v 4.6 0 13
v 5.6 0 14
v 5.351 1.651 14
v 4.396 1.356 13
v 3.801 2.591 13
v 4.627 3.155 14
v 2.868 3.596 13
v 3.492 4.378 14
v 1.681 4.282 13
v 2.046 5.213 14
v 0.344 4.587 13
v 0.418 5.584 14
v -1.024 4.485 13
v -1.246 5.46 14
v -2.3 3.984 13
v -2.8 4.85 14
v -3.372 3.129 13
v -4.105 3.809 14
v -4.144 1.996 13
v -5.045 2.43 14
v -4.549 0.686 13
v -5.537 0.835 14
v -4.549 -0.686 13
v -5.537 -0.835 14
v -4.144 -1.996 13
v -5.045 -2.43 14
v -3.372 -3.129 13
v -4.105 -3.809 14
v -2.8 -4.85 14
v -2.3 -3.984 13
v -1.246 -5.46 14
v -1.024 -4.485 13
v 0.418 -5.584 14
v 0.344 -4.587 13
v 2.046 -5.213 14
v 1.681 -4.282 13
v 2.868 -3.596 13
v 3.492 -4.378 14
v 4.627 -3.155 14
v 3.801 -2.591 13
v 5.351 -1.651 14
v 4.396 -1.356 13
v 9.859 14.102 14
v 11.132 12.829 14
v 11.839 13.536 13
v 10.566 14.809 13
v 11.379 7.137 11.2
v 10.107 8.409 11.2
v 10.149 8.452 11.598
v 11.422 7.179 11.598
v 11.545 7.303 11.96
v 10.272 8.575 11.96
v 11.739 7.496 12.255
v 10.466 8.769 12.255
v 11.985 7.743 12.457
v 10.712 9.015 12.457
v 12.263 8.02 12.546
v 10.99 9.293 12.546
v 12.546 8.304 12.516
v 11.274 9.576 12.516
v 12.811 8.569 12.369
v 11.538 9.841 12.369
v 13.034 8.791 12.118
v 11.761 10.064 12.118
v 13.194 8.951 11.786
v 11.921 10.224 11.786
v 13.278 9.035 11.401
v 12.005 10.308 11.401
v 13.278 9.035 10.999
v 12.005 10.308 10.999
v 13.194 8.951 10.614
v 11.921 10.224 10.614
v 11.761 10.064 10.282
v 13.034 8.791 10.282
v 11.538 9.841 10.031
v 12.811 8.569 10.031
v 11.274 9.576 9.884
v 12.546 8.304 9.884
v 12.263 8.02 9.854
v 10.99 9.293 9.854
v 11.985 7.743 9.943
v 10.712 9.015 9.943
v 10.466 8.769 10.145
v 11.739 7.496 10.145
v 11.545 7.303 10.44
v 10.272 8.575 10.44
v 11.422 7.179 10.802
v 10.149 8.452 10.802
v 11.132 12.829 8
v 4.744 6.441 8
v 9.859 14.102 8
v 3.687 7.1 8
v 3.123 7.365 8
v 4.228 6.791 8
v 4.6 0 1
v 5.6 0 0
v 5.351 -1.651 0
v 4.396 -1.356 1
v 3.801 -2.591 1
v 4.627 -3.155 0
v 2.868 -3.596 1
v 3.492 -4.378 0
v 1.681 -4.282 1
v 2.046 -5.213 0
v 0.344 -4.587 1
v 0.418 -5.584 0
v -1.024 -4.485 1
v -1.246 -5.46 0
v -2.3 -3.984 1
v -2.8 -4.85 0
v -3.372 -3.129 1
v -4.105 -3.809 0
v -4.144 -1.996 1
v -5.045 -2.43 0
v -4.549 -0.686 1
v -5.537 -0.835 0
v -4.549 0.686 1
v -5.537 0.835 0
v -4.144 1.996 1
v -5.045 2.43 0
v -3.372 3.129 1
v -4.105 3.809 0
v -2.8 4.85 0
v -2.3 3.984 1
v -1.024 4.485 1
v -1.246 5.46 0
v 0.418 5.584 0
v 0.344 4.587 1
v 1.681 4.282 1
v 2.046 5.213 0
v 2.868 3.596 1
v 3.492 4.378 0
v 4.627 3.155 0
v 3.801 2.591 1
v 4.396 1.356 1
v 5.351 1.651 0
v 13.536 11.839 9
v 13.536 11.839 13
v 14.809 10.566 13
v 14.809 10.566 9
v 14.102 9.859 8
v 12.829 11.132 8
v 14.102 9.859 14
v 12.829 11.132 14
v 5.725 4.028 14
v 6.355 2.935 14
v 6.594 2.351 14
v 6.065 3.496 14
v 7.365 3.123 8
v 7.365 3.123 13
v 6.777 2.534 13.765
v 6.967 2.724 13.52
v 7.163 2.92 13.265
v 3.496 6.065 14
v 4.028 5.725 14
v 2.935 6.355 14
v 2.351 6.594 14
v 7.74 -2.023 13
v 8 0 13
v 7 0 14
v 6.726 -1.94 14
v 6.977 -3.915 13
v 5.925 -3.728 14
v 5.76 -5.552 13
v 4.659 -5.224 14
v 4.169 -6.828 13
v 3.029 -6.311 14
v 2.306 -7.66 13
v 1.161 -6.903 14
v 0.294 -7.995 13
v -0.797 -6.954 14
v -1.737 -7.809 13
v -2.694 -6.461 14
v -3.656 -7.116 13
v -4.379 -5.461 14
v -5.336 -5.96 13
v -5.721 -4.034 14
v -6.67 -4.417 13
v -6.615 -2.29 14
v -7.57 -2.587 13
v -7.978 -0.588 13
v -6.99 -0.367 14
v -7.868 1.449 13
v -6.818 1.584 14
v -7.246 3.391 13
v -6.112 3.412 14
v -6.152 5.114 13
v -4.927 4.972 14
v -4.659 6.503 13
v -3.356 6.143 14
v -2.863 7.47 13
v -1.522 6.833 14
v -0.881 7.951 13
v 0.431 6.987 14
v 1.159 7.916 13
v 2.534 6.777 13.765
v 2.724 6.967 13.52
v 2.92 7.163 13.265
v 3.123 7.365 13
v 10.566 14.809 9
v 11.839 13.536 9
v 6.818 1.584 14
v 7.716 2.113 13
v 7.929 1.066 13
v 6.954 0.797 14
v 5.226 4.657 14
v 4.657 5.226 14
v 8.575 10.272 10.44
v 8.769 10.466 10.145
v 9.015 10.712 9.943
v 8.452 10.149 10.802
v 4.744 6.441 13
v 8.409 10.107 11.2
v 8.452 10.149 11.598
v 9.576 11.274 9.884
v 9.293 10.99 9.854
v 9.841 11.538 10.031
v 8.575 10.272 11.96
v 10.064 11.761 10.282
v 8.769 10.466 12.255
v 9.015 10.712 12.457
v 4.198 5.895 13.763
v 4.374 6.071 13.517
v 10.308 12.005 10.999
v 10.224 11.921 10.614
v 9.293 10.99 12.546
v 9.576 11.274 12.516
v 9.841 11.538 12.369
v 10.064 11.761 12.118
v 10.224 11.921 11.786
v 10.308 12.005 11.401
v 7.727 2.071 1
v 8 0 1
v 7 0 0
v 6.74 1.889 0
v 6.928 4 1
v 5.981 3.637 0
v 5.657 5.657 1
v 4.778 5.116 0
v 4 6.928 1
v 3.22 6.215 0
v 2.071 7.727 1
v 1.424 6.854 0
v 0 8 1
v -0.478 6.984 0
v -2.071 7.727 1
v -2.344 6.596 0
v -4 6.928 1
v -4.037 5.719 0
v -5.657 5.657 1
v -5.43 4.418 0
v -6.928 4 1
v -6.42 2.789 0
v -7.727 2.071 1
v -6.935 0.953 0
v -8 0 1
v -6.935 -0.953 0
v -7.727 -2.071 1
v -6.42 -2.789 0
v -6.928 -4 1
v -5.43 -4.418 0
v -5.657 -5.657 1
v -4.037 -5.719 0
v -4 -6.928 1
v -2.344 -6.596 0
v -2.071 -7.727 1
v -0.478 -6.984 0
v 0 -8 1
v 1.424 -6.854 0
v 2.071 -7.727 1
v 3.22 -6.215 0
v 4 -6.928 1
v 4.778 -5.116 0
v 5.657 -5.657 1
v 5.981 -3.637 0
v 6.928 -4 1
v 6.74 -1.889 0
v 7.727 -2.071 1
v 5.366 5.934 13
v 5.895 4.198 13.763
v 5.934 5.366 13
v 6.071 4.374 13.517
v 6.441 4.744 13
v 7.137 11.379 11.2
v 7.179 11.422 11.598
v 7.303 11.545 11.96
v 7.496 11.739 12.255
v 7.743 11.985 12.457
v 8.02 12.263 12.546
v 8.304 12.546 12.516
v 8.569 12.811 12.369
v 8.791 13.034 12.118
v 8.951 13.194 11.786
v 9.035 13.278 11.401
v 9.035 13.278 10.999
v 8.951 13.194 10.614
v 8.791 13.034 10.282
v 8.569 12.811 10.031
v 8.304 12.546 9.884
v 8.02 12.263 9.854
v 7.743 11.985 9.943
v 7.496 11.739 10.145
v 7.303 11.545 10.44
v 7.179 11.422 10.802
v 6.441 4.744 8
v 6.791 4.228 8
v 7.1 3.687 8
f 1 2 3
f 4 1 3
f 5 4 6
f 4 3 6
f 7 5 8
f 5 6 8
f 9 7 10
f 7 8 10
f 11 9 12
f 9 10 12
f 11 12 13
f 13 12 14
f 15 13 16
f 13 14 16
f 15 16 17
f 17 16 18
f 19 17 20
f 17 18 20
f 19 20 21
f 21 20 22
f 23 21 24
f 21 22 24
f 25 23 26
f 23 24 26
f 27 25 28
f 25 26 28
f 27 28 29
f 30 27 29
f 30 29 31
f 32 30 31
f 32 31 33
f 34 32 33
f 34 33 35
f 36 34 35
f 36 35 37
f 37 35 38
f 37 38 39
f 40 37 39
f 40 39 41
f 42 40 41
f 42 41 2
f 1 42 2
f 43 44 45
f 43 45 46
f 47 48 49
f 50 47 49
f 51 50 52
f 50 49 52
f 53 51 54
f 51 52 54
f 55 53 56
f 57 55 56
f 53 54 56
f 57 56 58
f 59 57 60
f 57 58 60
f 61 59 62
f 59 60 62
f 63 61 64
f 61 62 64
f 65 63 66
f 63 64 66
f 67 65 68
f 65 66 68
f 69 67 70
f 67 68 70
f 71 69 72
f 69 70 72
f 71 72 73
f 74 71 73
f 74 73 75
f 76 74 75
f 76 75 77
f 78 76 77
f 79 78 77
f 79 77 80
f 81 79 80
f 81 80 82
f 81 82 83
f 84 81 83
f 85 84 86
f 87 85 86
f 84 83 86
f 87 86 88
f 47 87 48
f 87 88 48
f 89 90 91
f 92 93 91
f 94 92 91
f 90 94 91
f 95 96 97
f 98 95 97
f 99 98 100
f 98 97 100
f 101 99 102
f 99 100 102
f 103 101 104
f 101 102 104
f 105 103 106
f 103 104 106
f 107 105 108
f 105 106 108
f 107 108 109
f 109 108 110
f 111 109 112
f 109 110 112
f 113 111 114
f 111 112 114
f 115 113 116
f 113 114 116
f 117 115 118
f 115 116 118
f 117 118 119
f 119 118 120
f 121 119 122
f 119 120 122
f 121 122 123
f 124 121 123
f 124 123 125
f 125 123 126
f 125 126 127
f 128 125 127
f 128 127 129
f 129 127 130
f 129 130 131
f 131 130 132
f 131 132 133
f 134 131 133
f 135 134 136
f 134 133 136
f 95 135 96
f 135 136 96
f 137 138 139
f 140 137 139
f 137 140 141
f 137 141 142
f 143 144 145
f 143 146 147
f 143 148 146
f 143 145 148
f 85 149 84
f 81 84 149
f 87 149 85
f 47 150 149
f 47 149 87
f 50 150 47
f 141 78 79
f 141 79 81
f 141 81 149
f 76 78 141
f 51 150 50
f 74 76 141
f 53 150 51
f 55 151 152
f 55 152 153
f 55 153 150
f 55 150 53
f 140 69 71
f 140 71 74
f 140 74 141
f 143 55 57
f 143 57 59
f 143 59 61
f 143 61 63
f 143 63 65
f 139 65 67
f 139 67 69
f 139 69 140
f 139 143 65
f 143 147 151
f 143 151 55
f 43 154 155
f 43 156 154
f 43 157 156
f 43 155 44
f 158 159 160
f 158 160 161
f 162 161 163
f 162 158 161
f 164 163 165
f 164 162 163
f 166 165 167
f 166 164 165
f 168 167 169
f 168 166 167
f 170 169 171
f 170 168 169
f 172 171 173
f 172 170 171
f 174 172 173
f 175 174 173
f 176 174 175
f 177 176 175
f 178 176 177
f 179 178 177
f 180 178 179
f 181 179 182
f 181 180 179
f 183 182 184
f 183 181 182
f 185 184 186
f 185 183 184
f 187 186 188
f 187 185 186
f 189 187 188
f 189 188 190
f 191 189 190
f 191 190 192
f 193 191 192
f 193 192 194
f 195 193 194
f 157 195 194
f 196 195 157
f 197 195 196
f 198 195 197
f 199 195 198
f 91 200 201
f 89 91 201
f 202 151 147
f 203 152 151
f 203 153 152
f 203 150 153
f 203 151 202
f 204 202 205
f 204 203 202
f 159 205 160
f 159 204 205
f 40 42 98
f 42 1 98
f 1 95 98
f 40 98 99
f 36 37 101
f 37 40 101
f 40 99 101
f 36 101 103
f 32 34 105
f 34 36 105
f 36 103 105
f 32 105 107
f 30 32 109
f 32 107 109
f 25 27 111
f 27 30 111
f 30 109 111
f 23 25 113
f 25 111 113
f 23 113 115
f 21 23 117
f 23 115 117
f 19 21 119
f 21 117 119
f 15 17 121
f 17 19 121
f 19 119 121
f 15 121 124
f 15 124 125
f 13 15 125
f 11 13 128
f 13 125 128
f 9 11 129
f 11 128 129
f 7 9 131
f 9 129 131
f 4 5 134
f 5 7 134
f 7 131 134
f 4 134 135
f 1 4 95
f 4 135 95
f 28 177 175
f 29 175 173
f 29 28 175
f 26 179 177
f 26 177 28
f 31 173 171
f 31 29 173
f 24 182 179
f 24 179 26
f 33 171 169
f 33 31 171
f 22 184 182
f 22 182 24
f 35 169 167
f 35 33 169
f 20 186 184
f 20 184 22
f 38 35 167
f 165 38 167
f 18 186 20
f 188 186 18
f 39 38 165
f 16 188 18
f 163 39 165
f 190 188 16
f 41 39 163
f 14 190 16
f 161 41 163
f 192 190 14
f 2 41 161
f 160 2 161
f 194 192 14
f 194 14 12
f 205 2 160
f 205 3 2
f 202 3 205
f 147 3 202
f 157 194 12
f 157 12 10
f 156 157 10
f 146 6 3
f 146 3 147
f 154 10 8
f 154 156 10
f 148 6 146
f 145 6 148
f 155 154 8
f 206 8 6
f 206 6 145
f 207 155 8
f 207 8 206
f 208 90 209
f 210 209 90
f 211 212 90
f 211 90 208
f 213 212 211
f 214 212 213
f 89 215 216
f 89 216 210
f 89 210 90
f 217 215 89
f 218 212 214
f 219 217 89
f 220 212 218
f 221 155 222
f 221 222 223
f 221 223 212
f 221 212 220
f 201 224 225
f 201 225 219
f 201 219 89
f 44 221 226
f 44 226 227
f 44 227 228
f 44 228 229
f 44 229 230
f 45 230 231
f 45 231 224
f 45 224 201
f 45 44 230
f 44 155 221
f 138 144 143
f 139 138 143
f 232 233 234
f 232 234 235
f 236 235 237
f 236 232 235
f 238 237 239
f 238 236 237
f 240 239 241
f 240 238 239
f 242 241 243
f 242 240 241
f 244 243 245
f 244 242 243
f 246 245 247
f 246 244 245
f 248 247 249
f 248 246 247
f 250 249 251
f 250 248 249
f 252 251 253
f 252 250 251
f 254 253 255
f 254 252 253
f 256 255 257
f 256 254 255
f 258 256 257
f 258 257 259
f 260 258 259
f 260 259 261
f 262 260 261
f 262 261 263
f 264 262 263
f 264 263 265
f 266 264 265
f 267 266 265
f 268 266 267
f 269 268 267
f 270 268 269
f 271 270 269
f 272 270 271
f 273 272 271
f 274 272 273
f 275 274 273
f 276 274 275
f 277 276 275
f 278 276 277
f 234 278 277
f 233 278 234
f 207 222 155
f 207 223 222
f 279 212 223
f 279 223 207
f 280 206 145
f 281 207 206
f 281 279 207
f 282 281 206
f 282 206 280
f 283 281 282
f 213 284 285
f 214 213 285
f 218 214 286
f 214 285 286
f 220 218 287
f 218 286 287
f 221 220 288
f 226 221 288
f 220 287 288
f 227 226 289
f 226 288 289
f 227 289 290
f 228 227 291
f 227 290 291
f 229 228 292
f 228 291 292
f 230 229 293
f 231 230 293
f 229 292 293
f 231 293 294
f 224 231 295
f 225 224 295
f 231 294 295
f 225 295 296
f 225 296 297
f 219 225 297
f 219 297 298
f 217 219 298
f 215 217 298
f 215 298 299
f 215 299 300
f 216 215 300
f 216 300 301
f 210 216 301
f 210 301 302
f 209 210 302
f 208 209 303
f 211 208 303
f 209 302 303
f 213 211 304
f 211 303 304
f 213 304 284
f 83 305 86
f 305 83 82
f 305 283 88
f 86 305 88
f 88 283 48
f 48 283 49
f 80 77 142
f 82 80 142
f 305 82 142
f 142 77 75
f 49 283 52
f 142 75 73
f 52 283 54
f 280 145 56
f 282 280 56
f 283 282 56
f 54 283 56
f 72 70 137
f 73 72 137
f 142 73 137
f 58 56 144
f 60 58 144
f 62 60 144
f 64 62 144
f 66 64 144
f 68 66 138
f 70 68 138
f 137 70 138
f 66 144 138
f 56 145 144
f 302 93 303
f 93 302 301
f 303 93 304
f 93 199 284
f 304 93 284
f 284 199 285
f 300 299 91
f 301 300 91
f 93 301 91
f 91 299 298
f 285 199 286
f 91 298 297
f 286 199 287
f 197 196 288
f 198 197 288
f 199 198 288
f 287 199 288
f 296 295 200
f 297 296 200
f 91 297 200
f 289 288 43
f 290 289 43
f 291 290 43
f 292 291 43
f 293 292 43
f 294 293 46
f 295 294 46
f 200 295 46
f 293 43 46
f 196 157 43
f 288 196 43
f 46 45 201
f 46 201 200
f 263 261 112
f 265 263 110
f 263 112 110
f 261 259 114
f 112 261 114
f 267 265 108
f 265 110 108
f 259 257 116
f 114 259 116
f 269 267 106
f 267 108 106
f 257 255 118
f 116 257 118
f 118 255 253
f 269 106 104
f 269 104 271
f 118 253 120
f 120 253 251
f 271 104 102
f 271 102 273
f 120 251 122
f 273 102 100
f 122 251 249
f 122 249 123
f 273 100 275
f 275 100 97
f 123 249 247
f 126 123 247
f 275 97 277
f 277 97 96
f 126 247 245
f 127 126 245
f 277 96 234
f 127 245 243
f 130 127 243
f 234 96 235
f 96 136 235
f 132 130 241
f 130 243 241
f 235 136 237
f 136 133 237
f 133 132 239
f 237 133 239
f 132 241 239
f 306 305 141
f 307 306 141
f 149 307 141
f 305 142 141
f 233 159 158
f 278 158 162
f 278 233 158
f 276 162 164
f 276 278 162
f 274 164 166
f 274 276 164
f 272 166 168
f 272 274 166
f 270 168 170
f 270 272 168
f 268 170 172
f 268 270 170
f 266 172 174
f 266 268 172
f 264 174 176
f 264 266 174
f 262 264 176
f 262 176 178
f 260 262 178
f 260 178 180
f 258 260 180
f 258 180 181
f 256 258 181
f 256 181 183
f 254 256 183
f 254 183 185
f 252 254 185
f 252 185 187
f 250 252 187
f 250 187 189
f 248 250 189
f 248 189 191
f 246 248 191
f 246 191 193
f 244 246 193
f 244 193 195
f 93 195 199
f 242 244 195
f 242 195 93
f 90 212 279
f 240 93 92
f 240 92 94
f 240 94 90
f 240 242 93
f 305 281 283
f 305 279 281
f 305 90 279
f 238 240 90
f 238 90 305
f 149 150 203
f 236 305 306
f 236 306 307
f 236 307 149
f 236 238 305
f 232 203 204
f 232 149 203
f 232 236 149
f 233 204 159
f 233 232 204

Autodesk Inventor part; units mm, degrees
ref_plane "YZ Plane" through (0, 0, 0) normal (1, 0, 0) x (0, 1, 0)
ref_plane "XZ Plane" through (0, 0, 0) normal (0, 1, 0) x (-1, 0, 0)
ref_plane "XY Plane" through (0, 0, 0) normal (0, 0, 1) x (1, 0, 0)
sketch "Эскиз1" plane through (0, 0, 0) normal (0, 0, 1) x (1, 0, 0)
  circle A0 centre (0, 0) radius 8.1 projected
  circle A1 centre (0, 0) radius 8
  circle A2 centre (0, 0) radius 4.6
  dimension "d0" = 0.1
  dimension "d1" = 9.2
extrude "Выдавливание1" add sketch "Эскиз1" along normal blind 14 contours A1
chamfer "Фаска1" distance 1 angle 45 4 edges at (-8, 0, 14) (-8, 0, 0) (-4.6, 0, 14) (-4.6, 0, 0)
sketch "Эскиз2" plane through (0, 0, 14) normal (0, 0, 1) x (1, 0, 0)
  circle A0 centre (15.2735, -186.1533) radius 2.5 projected
  circle A1 centre (19.2813, -181.6882) radius 2.5 projected
  circle A2 centre (6.7164, -177.6929) radius 2.5 projected
  circle A3 centre (6.7164, -107.6929) radius 2.5 projected
  circle A4 centre (11.2658, -120.6185) radius 2.5 projected
  circle A5 centre (6.7164, -37.6929) radius 2.5 projected
  circle A6 centre (15.2735, -46.1533) radius 2.5 projected
  circle A7 centre (23.2891, -37.223) radius 2.5 projected
  circle A8 centre (26, -154.7115) radius 6 projected
  circle A9 centre (26, -84.7115) radius 6 projected
  circle A10 centre (-32.5, -91.359) radius 1.5 projected
  circle A11 centre (-32.5, -21.359) radius 1.5 projected
  line L0 (15.5395, 14.1253) -> (7.4584, 6.0442) projected
  arc A12 (6.0442, 7.4584) -> (7.4584, 6.0442) centre (0, 0) ccw projected
  line L1 (6.0442, 7.4584) -> (14.1253, 15.5395) projected
  arc A13 (14.1253, 15.5395) -> (-20.9712, 1.0986) centre (0, 0) ccw projected
  arc A14 (-25.0526, -8.0684) -> (-20.9712, 1.0986) centre (-34.9521, 1.8311) ccw projected
  line L2 (-25.0526, -8.0684) -> (-27.881, -10.8968) projected
  line L3 (-27.881, -5.24) -> (-27.881, -10.8968) projected
  line L4 (-36.4645, -13.8234) -> (-27.881, -5.24) projected
  line L5 (-39, -19.9448) -> (-36.4645, -13.8234) projected
  line L6 (-39, -107.9932) -> (-39, -19.9448) projected
  line L7 (-38.7059, -110.2271) -> (-39, -107.9932) projected
  line L8 (-11.2941, -212.5294) -> (-38.7059, -110.2271) projected
  line L9 (-10, -222.359) -> (-11.2941, -212.5294) projected
  line L10 (-10, -239.5306) -> (-10, -222.359) projected
  line L11 (-5.9, -243.6306) -> (-10, -239.5306) projected
  line L12 (-5.9, -232.3168) -> (-5.9, -243.6306) projected
  line L13 (-5.9, -232.3168) -> (-1.4533, -236.7636) projected
  arc A15 (-0.3274, -237.8894) -> (-1.4533, -236.7636) centre (0.6355, -235.8007) ccw projected
  line L14 (-0.3274, -237.8894) -> (0.1419, -238.3587) projected
  line L15 (0.1419, -238.3587) -> (21.8181, -232.5506) projected
  arc A16 (21.8181, -232.5506) -> (28.9814, -229.4318) centre (15, -207.1051) ccw projected
  arc A17 (32.6098, -226.6973) -> (28.9814, -229.4318) centre (30.5792, -227.7773) ccw projected
  arc A18 (32.6098, -226.6973) -> (41.3431, -207.1051) centre (15, -207.1051) ccw projected
  line L16 (41.3431, -207.1051) -> (41.3431, -44.3275) projected
  line L17 (40.8708, -43.2834) -> (41.3431, -44.3275) projected
  line L18 (40.8708, -43.2834) -> (30.4465, -37.265) projected
  spline S0 degree 3 poles (30.4465, -37.265) (28.5259, -36.1561) (26.8693, -34.6988) (23.9575, -31.0426) (22.8201, -28.8572) (21.6341, -25.5426) (21.3338, -24.5174) (21.0841, -23.4772) knots -1.71756 -1.71756 -1.71756 -1.71756 -1.05224 -1.05224 -0.317791 -0.317791 0 0 0 0 projected
  arc A19 (20.3792, -6.3803) -> (21.0841, -23.4772) centre (26, -14.7115) ccw projected
  spline S1 degree 3 poles (20.3792, -6.3803) (20.4968, -5.2098) (20.6383, -4.0488) (20.7981, -2.9054) knots -3.756173 -3.756173 -3.756173 -3.756173 -3.409835 -3.409835 -3.409835 -3.409835 projected
  arc A20 (20.7981, -2.9054) -> (15.5395, 14.1253) centre (0, 0) ccw projected
  circle A21 centre (19.2813, -41.6882) radius 2.5 projected
  circle A22 centre (11.2658, -50.6185) radius 2.5 projected
  circle A23 centre (19.2813, -111.6882) radius 2.5 projected
  circle A24 centre (15.2735, -116.1533) radius 2.5 projected
  circle A25 centre (23.2891, -107.223) radius 2.5 projected
  circle A26 centre (23.2891, -177.223) radius 2.5 projected
  circle A27 centre (11.2658, -190.6185) radius 2.5 projected
  circle A28 centre (11.5956, -216.8171) radius 12.85 projected
  circle A29 centre (-7.3879, -205.857) radius 2.3 projected
  circle A30 centre (22.5558, -197.8336) radius 2.3 projected
  circle A31 centre (0, 0) radius 8 projected
  line L19 (2.3508, 6.5935) -> (12.5756, 16.8183)
  line L20 (6.0442, 7.4584) -> (4.1919, 5.6061)
  line L21 (11.9803, 13.3945) -> (10.5661, 14.8088)
  line L22 (10.5661, 11.9803) -> (11.9803, 10.5661)
  circle A32 centre (0, 0) radius 7 projected
  line L23 (0, 0) -> (10.0847, 10.0847)
  line L24 (6.5935, 2.3508) -> (16.8183, 12.5756)
  line L25 (7.4584, 6.0442) -> (5.6061, 4.1919)
  line L26 (13.3945, 11.9803) -> (14.8088, 10.5661)
  line L27 (4.0279, 5.725) -> (11.8389, 13.536)
  line L28 (5.725, 4.0279) -> (13.536, 11.8389)
  point P0 (6.5935, 2.3508)
  dimension "d7" = 2
  dimension "d8" = 2
  dimension "d14" = 0.2
  dimension "d15" = 0.2
extrude "Выдавливание2" add sketch "Эскиз2" against normal blind 6 contours L26 L24 A12 L28 | A12 L24 A31 L28 | A31 L24 A32 L28 | L19 L21 L27 A12 | A12 L27 A31 L19 | A31 L27 A32 L19
chamfer "Фаска2" distance 1 angle 45 4 edges at (11.2025, 14.1724, 14) (11.2025, 14.1724, 8) (14.1724, 11.2025, 14) (14.1724, 11.2025, 8)
sketch "Эскиз3" plane through (3.1227, 7.3654, 8) normal (-0.7071, 0.7071, 0) x (-0.7071, -0.7071, 0)
  circle A0 centre (-7.0266, 3.2) radius 1.5 projected
  circle A1 centre (-7.0266, 3.2) radius 1.35
  point P0 (7.4162, -8)
  dimension "d18" = 2.7
extrude "Выдавливание3" cut sketch "Эскиз3" against normal blind 6 contours A1
properties part number "Втулка"
